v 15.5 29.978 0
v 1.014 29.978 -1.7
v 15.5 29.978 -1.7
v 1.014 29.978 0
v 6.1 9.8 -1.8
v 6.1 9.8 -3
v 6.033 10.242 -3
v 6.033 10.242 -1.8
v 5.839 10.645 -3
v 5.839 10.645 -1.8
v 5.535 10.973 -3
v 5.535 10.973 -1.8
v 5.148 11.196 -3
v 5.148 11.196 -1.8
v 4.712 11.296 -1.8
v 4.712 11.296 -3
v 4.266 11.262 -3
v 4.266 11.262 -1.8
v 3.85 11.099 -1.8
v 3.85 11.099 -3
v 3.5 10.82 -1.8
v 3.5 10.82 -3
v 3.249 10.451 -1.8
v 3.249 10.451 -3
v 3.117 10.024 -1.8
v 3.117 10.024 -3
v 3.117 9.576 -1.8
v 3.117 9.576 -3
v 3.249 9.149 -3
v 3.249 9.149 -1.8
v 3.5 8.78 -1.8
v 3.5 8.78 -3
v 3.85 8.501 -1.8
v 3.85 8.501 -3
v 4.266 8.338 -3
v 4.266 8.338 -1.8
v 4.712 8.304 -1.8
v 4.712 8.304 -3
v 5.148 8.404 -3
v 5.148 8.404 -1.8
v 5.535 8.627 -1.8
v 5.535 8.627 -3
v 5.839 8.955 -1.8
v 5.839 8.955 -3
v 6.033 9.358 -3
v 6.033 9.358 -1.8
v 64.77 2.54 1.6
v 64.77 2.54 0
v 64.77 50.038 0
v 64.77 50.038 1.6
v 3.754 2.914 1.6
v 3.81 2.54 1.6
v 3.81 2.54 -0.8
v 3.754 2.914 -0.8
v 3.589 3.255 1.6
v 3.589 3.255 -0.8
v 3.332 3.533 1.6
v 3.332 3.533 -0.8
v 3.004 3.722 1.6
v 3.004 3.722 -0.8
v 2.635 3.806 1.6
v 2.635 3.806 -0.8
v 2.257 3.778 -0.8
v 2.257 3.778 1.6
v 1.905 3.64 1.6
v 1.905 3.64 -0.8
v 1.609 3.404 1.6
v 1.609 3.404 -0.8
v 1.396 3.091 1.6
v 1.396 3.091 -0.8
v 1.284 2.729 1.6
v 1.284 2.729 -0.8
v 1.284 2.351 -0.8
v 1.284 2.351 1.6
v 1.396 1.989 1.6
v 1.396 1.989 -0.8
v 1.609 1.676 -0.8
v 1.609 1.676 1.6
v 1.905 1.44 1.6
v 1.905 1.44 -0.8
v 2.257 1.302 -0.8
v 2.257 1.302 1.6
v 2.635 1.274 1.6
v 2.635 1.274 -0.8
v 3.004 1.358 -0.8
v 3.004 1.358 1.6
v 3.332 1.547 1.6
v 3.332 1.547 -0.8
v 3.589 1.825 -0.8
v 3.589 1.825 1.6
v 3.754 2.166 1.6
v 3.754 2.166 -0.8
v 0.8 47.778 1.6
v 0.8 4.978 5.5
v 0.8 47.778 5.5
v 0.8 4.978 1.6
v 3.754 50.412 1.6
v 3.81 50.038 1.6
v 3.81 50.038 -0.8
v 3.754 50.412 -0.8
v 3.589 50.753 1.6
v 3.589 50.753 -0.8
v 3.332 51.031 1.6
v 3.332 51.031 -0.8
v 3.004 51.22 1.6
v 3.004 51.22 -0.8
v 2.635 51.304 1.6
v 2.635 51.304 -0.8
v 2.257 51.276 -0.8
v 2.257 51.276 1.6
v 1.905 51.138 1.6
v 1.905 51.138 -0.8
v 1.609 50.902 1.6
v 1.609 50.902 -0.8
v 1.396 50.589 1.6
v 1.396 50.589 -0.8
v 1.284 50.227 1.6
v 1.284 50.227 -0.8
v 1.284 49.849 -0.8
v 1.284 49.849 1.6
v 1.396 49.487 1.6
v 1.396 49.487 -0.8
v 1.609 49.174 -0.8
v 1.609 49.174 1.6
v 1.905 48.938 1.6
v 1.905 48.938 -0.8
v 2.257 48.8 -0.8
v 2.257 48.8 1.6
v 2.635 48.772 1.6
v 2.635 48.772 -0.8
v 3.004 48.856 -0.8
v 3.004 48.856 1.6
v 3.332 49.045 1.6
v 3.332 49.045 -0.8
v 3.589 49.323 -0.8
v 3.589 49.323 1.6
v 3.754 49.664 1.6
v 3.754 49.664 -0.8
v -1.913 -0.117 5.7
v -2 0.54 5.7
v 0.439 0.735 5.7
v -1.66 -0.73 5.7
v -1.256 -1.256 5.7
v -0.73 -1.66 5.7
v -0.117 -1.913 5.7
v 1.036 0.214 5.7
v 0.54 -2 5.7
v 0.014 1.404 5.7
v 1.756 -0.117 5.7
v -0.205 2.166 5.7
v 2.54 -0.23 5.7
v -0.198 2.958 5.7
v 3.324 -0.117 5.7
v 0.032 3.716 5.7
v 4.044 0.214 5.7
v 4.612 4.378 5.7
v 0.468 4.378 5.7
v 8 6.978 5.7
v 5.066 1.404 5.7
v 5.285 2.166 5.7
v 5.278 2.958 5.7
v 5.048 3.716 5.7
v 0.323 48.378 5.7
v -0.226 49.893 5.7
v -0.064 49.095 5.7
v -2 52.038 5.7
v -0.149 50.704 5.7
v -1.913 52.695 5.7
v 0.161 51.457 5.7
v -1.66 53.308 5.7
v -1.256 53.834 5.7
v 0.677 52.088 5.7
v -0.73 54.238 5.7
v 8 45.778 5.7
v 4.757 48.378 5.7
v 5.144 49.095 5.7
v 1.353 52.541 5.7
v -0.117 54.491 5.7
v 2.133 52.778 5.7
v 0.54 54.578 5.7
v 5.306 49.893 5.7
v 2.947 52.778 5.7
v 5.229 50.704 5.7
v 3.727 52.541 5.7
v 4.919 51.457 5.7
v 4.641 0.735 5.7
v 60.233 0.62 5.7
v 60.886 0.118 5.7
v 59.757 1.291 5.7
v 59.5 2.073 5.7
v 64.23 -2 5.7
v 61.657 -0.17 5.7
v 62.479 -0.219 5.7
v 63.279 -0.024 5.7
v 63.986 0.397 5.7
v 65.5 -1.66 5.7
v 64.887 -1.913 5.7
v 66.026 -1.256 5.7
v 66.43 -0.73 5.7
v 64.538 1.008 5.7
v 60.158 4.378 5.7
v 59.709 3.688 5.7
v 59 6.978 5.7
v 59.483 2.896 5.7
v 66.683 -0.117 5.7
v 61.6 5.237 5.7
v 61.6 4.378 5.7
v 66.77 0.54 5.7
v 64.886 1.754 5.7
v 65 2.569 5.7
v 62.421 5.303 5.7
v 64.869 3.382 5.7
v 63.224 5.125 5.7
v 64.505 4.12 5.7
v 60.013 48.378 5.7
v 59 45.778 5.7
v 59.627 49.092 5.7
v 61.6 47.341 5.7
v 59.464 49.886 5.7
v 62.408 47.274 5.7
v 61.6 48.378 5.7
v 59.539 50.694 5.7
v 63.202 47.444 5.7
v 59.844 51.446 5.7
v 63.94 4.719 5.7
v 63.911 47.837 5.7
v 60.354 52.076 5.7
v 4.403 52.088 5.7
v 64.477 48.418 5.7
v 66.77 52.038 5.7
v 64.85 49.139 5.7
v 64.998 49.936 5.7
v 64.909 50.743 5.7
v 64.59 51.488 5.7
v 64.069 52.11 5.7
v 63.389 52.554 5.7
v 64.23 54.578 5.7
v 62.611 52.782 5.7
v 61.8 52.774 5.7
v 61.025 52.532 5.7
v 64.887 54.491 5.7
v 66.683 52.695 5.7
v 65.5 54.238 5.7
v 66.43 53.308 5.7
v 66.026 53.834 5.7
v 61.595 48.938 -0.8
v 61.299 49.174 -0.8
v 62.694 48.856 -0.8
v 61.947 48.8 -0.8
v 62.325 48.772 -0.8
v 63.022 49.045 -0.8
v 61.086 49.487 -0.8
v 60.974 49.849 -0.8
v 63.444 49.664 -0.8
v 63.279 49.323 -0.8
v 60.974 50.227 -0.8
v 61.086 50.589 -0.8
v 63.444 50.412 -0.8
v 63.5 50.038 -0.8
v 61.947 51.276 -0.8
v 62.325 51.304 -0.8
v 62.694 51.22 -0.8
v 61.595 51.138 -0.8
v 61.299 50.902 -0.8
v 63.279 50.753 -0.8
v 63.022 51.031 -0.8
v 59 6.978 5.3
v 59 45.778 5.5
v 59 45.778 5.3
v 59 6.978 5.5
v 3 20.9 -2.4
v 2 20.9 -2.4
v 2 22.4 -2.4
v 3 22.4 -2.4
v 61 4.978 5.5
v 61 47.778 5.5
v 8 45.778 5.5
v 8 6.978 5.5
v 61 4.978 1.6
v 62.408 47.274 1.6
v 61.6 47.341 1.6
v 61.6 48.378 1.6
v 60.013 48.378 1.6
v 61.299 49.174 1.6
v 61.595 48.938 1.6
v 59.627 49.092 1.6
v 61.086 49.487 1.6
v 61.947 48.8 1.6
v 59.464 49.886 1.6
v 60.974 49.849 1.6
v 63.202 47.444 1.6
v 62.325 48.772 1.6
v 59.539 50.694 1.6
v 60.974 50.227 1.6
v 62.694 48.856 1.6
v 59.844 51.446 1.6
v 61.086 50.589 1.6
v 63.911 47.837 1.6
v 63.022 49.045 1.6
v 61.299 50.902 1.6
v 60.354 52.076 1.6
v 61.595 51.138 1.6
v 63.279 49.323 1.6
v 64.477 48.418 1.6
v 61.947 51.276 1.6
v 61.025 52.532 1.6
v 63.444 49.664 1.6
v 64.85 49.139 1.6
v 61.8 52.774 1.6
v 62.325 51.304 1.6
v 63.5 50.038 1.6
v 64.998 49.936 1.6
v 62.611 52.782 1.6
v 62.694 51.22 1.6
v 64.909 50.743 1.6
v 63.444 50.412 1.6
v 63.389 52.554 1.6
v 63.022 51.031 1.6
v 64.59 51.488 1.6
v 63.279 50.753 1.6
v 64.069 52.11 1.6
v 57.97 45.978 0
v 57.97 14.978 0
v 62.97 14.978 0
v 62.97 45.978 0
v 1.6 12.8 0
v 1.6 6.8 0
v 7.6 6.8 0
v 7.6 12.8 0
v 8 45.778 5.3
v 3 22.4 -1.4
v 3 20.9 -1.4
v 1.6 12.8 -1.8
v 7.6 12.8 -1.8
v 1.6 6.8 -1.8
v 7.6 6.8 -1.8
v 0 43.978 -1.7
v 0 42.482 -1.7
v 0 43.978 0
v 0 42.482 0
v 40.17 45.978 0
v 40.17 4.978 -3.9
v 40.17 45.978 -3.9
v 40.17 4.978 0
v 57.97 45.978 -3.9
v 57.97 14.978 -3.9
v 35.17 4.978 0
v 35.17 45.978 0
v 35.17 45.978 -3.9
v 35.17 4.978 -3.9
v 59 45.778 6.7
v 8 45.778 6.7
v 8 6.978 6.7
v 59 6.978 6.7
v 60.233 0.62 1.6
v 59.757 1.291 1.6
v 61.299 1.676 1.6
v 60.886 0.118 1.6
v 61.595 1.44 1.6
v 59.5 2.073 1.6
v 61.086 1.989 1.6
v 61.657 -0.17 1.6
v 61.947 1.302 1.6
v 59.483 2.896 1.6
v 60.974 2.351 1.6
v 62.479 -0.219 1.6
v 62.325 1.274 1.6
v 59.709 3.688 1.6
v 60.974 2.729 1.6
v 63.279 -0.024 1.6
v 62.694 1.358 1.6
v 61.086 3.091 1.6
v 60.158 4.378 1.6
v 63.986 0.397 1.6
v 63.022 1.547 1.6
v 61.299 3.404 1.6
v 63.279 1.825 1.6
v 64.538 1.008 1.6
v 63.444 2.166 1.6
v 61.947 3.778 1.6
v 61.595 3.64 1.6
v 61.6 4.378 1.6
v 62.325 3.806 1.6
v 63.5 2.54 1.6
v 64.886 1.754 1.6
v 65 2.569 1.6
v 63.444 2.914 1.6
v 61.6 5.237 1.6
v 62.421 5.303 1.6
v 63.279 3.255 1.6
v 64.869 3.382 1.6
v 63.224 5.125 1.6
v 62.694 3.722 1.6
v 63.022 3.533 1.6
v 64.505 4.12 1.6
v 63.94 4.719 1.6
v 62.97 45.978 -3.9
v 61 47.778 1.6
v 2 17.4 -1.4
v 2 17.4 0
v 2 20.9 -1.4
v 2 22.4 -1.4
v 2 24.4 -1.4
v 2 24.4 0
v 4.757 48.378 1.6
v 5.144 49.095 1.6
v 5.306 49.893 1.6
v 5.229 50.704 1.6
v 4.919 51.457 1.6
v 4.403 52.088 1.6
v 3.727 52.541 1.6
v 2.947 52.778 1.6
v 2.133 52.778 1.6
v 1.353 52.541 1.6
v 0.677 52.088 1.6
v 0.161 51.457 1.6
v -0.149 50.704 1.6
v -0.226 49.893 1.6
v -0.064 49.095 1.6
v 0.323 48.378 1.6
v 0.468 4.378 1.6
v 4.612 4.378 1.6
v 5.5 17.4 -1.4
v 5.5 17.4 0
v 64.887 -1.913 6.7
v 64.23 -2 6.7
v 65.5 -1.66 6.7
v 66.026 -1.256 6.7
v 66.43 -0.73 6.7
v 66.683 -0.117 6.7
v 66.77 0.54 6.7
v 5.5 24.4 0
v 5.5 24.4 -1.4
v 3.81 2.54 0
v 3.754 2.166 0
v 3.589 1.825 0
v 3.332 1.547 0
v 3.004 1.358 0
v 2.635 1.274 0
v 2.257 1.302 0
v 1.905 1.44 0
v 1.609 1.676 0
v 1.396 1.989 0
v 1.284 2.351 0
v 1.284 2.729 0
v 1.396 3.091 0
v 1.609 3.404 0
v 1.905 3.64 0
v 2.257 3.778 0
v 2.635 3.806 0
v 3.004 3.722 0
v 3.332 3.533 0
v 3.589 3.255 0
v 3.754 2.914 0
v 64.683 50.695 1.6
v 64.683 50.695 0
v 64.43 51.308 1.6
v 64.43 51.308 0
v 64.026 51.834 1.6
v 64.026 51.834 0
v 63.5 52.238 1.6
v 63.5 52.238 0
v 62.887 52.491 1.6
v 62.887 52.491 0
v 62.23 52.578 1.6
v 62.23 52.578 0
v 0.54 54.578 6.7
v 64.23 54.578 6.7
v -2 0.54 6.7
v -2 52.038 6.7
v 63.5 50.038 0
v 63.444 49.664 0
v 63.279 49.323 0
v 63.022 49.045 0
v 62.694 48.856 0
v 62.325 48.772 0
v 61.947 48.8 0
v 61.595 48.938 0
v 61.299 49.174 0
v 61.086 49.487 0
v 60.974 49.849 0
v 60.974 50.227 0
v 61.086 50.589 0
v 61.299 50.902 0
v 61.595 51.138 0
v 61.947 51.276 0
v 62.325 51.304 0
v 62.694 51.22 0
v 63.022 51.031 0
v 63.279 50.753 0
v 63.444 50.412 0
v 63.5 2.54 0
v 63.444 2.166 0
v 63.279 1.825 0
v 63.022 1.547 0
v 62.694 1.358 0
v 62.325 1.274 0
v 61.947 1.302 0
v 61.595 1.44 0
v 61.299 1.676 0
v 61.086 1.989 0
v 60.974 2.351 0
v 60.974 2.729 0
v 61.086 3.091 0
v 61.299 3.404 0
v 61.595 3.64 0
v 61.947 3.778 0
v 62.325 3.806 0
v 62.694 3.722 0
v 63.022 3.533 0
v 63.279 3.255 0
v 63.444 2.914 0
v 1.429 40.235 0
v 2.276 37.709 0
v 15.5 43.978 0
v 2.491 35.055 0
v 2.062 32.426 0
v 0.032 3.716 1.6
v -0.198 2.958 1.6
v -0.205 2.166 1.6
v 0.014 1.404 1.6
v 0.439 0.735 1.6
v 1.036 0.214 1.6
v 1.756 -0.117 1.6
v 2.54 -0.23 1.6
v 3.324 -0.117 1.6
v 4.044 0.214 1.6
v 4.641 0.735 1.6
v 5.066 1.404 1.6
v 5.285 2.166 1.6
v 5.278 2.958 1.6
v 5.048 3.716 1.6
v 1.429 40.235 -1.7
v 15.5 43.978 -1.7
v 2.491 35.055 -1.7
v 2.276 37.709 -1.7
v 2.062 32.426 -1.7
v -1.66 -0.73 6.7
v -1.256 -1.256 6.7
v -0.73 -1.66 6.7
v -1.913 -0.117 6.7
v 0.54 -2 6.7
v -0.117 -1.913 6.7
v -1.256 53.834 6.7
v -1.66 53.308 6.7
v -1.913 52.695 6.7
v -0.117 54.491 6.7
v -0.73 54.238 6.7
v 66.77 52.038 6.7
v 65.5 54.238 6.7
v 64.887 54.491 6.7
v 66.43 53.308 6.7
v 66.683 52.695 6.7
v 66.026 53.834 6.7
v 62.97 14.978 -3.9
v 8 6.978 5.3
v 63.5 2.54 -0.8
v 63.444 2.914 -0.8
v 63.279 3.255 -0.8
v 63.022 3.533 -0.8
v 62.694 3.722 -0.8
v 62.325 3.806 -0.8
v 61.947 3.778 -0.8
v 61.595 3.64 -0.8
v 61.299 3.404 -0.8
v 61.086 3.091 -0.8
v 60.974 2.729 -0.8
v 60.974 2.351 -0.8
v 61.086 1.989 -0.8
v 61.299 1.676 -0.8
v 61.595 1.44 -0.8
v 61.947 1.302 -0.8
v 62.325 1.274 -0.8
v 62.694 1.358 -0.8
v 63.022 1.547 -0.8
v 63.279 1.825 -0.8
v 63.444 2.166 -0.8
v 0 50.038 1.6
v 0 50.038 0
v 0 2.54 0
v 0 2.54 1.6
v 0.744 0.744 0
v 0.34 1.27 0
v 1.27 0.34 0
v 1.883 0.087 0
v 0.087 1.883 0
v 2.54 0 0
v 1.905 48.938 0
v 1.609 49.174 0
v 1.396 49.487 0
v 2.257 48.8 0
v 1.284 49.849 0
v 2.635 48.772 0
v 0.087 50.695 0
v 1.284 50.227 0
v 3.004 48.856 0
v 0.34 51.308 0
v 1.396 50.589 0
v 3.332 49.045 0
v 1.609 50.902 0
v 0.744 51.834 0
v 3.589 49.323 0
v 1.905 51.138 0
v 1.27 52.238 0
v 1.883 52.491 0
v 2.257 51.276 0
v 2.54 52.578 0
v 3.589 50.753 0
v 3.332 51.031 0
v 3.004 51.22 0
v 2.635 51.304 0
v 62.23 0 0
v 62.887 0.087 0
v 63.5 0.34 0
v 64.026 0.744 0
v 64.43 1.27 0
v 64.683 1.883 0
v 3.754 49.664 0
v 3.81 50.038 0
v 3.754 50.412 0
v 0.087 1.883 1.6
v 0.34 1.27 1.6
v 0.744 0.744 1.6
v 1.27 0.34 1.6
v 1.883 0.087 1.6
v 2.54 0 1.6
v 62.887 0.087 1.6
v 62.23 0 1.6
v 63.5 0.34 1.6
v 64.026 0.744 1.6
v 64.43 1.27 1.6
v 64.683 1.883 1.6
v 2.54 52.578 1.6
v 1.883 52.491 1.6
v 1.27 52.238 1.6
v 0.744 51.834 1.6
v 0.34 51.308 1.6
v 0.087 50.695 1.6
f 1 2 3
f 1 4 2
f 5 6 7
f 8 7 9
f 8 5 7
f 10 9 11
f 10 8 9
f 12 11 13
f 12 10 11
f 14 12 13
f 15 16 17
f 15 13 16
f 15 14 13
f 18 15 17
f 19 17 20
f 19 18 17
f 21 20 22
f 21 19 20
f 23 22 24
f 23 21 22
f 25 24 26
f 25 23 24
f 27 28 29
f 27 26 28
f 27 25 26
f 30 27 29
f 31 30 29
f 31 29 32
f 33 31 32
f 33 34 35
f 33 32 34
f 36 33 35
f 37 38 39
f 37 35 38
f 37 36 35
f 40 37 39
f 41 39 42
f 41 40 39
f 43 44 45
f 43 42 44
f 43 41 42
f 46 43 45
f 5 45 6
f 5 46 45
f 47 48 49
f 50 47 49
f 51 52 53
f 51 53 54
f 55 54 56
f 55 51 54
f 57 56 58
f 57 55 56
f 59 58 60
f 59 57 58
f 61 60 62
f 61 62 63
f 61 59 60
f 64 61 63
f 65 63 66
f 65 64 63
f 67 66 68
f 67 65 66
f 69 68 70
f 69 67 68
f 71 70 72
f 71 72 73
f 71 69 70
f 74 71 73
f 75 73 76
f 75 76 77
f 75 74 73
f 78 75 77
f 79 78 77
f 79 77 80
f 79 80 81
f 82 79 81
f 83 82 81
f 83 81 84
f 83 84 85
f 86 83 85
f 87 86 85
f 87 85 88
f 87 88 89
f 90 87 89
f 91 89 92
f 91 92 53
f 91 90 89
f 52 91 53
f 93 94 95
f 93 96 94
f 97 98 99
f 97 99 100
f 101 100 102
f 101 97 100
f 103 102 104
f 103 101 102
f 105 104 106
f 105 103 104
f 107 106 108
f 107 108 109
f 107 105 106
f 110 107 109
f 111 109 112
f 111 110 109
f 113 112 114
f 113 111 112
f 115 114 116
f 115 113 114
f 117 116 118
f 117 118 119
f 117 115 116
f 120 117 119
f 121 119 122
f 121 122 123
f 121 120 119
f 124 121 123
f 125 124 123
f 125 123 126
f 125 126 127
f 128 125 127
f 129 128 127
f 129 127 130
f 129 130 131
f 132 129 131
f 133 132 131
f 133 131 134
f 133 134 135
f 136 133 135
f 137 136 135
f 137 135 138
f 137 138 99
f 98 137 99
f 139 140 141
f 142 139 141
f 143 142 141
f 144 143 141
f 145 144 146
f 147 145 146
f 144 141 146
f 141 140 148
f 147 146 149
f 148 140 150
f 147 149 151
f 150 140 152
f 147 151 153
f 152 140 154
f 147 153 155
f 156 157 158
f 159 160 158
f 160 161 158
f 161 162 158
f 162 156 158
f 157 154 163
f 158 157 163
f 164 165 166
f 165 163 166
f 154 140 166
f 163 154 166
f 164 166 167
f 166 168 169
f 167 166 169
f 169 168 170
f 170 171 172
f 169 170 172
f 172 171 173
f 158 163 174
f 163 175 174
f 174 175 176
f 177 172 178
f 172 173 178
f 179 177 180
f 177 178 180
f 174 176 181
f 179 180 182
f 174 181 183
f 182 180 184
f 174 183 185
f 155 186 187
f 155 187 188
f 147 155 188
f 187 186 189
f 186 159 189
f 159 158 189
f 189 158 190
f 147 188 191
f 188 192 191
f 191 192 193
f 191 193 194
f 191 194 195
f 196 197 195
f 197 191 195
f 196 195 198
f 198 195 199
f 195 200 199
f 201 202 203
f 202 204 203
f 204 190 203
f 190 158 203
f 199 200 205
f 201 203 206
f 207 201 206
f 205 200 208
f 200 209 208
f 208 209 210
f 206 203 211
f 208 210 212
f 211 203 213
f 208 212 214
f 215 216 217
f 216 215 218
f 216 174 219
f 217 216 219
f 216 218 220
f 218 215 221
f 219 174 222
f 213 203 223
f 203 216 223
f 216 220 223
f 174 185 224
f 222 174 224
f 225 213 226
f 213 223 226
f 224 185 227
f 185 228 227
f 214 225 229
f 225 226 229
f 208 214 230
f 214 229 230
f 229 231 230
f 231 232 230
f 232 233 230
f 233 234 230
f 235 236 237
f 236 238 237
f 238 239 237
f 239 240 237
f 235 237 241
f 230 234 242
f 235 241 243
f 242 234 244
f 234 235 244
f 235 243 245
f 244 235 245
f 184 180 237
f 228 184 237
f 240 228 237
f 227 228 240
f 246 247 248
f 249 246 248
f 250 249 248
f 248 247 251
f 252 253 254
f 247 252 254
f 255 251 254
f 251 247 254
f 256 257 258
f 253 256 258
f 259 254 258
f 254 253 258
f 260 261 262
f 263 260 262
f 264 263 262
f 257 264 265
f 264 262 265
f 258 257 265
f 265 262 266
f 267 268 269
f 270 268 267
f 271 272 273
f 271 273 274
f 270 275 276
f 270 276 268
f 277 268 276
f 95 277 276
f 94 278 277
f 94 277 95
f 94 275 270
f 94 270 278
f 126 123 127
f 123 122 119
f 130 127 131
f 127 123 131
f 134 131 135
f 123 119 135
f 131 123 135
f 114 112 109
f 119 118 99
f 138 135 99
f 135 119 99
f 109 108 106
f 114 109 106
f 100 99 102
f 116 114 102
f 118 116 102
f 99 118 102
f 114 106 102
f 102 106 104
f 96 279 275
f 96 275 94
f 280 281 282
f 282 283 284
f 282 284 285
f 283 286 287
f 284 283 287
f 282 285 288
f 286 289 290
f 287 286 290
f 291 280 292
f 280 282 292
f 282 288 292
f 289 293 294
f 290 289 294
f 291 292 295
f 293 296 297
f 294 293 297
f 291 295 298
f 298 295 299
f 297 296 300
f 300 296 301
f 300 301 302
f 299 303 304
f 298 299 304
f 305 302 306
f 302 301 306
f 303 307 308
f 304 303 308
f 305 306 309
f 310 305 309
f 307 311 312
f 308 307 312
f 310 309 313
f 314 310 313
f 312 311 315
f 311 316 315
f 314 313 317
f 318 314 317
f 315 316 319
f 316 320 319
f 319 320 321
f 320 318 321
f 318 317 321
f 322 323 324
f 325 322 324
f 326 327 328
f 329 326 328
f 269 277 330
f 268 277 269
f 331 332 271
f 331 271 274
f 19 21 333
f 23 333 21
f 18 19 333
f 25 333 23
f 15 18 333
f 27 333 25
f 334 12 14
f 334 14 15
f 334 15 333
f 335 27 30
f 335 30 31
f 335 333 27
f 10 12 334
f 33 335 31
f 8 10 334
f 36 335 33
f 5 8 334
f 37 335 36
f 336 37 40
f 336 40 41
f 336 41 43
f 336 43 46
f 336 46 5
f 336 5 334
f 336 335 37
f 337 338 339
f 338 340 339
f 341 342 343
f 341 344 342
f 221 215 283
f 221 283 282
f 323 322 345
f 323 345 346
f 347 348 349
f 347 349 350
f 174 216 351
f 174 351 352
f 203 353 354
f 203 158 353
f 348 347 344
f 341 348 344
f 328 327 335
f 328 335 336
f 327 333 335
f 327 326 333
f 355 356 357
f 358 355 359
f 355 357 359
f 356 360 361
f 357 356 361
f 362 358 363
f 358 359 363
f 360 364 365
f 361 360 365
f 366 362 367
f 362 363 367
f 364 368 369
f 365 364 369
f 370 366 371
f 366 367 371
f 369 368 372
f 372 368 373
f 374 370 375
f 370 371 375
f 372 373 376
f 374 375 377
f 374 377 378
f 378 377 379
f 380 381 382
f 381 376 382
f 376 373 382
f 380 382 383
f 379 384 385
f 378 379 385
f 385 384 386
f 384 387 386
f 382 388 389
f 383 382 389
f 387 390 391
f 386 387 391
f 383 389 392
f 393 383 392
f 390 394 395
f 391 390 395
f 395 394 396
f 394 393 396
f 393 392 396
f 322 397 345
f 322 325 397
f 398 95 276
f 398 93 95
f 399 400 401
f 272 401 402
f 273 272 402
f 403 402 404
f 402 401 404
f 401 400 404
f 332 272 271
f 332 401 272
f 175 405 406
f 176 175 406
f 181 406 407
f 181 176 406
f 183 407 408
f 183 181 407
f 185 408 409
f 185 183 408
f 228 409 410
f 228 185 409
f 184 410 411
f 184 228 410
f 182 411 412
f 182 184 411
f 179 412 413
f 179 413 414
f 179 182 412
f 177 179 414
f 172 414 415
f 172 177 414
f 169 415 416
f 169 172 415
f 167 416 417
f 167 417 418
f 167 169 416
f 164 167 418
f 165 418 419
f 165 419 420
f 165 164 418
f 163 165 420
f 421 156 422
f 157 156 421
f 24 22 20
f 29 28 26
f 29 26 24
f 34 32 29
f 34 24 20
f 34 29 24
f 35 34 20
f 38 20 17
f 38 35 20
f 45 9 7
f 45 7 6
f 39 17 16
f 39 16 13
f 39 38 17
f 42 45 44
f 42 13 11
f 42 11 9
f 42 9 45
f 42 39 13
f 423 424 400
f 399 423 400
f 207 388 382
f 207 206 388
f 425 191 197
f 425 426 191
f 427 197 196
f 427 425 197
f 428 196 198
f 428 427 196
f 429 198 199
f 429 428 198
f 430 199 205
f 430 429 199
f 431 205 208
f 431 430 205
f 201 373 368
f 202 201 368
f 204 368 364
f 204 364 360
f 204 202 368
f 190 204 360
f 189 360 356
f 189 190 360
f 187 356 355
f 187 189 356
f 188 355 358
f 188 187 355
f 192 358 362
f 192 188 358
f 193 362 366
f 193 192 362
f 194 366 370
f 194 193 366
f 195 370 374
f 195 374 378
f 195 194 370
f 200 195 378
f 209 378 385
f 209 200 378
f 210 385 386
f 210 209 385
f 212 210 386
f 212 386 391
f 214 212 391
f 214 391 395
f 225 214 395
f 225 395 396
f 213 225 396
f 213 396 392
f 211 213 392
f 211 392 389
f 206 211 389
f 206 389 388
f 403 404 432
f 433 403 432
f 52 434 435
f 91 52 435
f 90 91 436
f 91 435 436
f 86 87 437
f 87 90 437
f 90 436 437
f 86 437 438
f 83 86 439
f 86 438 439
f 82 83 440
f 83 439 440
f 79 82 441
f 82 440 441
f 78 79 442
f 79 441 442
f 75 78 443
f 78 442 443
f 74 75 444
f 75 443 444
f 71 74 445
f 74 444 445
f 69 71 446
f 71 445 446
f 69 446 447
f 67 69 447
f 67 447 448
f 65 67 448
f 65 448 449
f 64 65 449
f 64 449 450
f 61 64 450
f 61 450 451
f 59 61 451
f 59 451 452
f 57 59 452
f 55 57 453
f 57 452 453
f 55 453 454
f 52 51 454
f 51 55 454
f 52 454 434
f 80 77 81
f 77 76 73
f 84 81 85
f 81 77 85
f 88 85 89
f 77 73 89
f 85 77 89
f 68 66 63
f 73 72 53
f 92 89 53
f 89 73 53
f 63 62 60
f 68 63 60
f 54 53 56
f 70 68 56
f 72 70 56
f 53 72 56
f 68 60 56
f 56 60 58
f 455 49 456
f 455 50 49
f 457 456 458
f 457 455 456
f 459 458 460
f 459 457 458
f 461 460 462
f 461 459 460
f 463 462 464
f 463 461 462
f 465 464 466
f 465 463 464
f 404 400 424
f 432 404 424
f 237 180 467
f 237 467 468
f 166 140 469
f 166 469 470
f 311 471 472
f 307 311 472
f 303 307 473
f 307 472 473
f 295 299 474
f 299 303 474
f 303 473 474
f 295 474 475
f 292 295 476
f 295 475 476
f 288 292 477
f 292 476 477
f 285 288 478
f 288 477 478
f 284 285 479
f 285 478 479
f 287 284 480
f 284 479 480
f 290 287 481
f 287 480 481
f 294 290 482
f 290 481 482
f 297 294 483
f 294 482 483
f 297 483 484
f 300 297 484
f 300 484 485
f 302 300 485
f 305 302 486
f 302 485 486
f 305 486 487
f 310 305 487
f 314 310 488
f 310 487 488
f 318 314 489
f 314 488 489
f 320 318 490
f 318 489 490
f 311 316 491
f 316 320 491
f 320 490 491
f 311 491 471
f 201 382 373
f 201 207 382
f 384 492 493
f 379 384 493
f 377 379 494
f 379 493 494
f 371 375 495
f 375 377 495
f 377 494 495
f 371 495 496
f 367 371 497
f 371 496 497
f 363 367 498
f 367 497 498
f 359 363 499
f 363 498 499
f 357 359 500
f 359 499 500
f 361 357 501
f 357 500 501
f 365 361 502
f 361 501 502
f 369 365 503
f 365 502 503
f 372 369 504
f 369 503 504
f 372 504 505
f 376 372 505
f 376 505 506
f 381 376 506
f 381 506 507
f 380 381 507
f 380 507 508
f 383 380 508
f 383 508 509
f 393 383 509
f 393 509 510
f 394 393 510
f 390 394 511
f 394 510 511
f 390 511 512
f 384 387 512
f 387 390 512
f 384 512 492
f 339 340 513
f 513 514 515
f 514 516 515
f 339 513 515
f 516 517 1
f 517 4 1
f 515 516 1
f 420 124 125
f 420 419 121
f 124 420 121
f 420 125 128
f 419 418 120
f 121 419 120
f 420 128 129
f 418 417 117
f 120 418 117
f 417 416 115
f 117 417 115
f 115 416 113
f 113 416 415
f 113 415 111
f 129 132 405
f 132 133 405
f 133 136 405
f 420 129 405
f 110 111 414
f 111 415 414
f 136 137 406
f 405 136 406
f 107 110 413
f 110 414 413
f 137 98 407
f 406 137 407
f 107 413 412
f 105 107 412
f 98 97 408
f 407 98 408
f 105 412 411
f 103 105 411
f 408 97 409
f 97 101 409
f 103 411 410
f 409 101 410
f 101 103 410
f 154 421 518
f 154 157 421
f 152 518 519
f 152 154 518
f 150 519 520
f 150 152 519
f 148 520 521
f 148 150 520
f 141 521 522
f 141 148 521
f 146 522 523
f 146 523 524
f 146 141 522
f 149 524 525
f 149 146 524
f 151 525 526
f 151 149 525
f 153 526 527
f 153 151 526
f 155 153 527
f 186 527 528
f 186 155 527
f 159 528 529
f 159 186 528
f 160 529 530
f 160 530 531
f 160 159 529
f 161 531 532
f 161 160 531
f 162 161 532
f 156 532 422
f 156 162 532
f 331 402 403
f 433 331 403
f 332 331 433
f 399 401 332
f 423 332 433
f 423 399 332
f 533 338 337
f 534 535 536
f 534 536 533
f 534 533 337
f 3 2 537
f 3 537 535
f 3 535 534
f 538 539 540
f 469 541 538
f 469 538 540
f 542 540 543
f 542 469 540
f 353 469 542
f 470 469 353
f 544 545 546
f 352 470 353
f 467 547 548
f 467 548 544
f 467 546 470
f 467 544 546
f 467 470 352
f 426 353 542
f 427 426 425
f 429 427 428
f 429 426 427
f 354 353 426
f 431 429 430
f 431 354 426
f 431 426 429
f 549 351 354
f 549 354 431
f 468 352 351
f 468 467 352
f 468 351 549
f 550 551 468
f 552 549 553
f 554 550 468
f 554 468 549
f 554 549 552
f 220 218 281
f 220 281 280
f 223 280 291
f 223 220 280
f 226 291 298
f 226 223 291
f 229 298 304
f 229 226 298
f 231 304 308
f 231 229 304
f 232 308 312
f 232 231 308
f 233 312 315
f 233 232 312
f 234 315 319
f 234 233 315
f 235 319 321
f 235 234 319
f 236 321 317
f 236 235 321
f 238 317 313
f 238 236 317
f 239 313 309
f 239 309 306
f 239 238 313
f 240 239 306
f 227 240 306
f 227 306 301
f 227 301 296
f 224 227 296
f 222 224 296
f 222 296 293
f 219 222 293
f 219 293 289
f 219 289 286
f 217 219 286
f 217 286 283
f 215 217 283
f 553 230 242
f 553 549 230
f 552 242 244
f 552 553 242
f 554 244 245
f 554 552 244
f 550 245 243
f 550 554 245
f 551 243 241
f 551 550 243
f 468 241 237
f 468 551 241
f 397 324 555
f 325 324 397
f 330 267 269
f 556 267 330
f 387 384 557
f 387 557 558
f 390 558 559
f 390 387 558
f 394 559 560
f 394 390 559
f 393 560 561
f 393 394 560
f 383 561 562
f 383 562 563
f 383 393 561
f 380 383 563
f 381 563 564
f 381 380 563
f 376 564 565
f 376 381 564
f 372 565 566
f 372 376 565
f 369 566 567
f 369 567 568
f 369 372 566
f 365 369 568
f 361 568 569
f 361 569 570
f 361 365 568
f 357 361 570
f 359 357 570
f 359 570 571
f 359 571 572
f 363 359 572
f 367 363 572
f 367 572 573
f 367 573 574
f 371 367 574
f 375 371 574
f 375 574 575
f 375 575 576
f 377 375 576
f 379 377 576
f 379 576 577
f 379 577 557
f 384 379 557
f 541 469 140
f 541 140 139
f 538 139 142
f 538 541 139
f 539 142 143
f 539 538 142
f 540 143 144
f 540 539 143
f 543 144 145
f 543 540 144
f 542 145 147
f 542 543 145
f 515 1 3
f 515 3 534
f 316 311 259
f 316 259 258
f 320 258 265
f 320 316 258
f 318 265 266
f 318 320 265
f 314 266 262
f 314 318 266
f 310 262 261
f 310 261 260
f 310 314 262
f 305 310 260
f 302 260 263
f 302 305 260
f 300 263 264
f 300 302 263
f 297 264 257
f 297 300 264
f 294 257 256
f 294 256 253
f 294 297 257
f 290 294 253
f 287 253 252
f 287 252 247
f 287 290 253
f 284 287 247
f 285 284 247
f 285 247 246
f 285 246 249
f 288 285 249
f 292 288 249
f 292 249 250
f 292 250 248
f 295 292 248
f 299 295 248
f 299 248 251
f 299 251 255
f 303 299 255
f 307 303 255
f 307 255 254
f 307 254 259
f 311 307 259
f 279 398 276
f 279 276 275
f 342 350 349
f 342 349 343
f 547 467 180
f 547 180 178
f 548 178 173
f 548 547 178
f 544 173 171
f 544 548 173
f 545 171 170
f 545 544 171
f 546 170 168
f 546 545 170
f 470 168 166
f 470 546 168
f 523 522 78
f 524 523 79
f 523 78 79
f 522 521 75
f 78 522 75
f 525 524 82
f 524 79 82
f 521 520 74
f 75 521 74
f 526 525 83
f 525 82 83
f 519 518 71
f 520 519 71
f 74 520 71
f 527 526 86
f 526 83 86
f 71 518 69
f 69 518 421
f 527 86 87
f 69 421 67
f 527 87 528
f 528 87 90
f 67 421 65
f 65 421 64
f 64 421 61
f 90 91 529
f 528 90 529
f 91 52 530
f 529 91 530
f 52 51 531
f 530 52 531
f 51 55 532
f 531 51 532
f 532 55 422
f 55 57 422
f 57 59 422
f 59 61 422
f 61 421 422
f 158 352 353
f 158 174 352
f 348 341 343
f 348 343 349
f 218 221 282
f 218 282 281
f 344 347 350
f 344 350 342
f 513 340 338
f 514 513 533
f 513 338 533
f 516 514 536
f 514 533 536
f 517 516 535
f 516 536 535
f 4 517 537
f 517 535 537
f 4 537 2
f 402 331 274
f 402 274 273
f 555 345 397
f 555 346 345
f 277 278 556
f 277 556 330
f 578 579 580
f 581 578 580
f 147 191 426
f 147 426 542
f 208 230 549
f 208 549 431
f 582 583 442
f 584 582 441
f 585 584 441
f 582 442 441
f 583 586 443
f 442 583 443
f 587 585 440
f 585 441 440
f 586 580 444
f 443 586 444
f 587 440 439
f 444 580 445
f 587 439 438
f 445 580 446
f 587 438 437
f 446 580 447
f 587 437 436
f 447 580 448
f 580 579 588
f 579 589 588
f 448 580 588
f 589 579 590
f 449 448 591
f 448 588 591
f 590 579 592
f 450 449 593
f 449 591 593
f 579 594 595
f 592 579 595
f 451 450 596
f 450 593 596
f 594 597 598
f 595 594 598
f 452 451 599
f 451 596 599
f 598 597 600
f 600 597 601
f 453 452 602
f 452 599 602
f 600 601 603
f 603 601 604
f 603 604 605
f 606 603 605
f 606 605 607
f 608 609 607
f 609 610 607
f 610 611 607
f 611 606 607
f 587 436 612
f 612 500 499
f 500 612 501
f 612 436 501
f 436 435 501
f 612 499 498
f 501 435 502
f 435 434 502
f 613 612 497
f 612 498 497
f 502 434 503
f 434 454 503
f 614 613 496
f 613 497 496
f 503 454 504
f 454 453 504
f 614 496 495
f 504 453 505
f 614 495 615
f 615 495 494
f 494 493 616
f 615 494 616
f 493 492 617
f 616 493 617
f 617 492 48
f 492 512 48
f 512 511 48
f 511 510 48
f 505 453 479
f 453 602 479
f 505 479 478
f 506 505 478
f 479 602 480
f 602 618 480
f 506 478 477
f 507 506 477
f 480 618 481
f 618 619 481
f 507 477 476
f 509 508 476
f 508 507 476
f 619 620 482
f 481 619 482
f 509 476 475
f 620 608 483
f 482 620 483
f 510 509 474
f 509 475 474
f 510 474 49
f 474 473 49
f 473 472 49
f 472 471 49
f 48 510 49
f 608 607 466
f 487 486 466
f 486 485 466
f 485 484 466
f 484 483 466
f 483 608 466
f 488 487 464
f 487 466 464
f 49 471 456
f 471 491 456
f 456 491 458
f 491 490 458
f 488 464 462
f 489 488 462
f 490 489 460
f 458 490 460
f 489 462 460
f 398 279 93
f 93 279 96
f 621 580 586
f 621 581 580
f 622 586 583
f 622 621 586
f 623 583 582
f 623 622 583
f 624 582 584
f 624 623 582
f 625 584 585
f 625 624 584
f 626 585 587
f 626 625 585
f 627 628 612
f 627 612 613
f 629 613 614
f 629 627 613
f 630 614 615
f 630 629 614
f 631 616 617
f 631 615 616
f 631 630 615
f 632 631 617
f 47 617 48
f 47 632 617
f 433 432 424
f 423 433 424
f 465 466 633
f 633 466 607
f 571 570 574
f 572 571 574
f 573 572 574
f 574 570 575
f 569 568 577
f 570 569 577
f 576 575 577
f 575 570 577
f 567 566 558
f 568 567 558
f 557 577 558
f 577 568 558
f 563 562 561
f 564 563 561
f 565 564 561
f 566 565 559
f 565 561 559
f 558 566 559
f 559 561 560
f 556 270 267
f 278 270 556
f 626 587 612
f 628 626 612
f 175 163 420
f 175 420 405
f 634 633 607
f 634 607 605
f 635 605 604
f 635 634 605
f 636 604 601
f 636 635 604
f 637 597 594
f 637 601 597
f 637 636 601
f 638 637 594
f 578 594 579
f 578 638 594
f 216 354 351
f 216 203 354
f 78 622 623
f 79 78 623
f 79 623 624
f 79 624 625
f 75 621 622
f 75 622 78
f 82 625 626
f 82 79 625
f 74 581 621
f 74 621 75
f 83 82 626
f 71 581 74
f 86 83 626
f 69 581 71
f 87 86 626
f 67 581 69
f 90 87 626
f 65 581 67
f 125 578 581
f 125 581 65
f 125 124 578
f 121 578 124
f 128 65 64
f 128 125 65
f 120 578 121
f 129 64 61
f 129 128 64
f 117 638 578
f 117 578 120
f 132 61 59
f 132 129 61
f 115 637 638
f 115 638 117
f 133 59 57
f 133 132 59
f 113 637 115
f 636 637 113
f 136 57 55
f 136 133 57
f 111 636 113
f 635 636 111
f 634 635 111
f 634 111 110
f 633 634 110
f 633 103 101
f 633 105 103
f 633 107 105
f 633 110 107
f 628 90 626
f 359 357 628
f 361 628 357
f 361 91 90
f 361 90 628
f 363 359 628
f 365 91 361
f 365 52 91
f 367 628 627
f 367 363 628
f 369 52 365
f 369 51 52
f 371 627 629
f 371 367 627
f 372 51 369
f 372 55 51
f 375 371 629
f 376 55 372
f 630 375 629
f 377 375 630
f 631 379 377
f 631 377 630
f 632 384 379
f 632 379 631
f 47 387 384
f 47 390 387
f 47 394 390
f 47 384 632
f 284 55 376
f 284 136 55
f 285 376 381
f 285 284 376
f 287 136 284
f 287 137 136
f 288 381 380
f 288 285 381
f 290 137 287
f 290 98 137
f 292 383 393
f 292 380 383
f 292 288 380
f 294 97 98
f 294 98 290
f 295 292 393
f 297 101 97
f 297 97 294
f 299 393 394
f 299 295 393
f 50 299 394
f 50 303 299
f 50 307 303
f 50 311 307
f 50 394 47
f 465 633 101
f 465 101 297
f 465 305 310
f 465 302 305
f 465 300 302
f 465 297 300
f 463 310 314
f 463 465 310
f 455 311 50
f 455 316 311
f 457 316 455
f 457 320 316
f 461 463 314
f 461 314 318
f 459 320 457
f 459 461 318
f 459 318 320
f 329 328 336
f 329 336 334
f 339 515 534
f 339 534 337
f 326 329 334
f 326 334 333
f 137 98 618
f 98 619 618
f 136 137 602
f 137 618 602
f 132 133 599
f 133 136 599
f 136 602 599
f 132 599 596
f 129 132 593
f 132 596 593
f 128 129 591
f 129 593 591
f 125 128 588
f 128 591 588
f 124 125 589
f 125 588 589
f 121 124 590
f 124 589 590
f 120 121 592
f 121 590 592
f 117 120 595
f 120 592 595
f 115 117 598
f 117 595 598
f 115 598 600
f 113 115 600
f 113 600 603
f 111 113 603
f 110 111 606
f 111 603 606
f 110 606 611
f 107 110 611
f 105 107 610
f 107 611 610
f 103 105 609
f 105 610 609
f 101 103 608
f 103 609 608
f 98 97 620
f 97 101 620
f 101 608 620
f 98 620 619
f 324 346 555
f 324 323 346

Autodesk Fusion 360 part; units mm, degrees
sketch "pcb" plane through (0, 0, 0) normal (0, 0, 1) x (1, 0, 0)
  line L0 (0, 0) -> (64.77, 0)
  line L1 (64.77, 0) -> (64.77, 52.578)
  line L2 (64.77, 52.578) -> (0, 52.578)
  line L3 (0, 52.578) -> (0, 0)
  circle A0 centre (2.54, 50.038) radius 1.27
  line L4 (32.385, 52.578) -> (32.385, 0) construction
  line L5 (0, 26.289) -> (64.77, 26.289) construction
  circle A1 centre (62.23, 50.038) radius 1.27
  circle A2 centre (2.54, 2.54) radius 1.27
  circle A3 centre (62.23, 2.54) radius 1.27
  dimension "d1" = 64.77
  dimension "d2" = 52.578
  dimension "d3" = 2.54
  dimension "d4" = 2.54
  dimension "d5" = 2.54
extrude "Extrude1" add sketch "pcb" along normal blind 1.6 makes body 1
fillet "Fillet1" radius 2.54 4 edges at (64.77, 0, 0.8) (0, 0, 0.8) (0, 52.578, 0.8) (64.77, 52.578, 0.8) on bodies 1
sketch "bottom" plane through (0, 0, 0) normal (0, 0, -1) x (1, 0, 0)
  circle A0 centre (62.23, -50.038) radius 1.27
  circle A1 centre (2.54, -2.54) radius 1.27
  circle A2 centre (62.23, -2.54) radius 1.27
  circle A3 centre (2.54, -50.038) radius 1.27
  arc A4 (62.23, -52.578) -> (64.77, -50.038) centre (62.23, -50.038) ccw
  line L0 (64.77, -50.038) -> (64.77, -2.54)
  arc A5 (64.77, -2.54) -> (62.23, 0) centre (62.23, -2.54) ccw
  line L1 (62.23, 0) -> (2.54, 0)
  arc A6 (2.54, 0) -> (0, -2.54) centre (2.54, -2.54) ccw
  line L2 (0, -2.54) -> (0, -50.038)
  arc A7 (0, -50.038) -> (2.54, -52.578) centre (2.54, -50.038) ccw
  line L3 (2.54, -52.578) -> (62.23, -52.578)
  line L4 (62.97, -45.978) -> (57.97, -45.978)
  line L5 (57.97, -45.978) -> (57.97, -14.978)
  line L6 (57.97, -14.978) -> (62.97, -14.978)
  line L7 (62.97, -14.978) -> (62.97, -45.978)
  line L8 (40.17, -45.978) -> (35.17, -45.978)
  line L9 (35.17, -45.978) -> (35.17, -4.978)
  line L10 (35.17, -4.978) -> (40.17, -4.978)
  line L11 (40.17, -4.978) -> (40.17, -45.978)
  line L12 (1.6, -6.8) -> (7.6, -6.8)
  line L13 (7.6, -6.8) -> (7.6, -12.8)
  line L14 (7.6, -12.8) -> (1.6, -12.8)
  line L15 (1.6, -12.8) -> (1.6, -6.8)
  line L16 (1.6, -6.8) -> (7.6, -12.8) construction
  line L17 (7.6, -6.8) -> (1.6, -12.8) construction
  circle A8 centre (4.6, -9.8) radius 1.5
  line L18 (5.5, -17.4) -> (2, -17.4)
  line L19 (2, -17.4) -> (2, -24.4)
  line L20 (2, -24.4) -> (5.5, -24.4)
  line L21 (5.5, -24.4) -> (5.5, -17.4)
  line L22 (15.5, -43.978) -> (0, -43.978)
  line L23 (0, -43.978) -> (0, -29.978)
  line L24 (0, -29.978) -> (15.5, -29.978)
  line L25 (15.5, -29.978) -> (15.5, -43.978)
  point P0 (4.6, -9.8)
  dimension "d9" = 5
  dimension "d10" = 5
  dimension "d11" = 31
  dimension "d12" = 41
  dimension "d13" = 6.6
  dimension "d14" = 6.6
  dimension "d15" = 1.8
  dimension "d16" = 17.8
  dimension "d19" = 6
  dimension "d20" = 6
  dimension "d21" = 6.8
  dimension "d22" = 1.6
  dimension "d23" = 3
  dimension "d28" = 3.5
  dimension "d29" = 7
  dimension "d30" = 2
  dimension "d31" = 17.4
  dimension "d32" = 15.5
  dimension "d33" = 14
  dimension "d34" = 8.6
extrude "Extrude2" add sketch "bottom" along normal blind 3.9 separate body contours L4 L5 L6 L7 | L8 L9 L10 L11 makes body 2 at (61.3033, 25.3113, 0) makes body 3 at (38.5033, 32.3113, 0)
extrude "Extrude3" add sketch "bottom" along normal blind 1.8 separate body contours L12 L13 L14 L15 | A8 makes body 4
extrude "Extrude4" add sketch "bottom" along normal blind 3 contours A8 bodies 4
extrude "Extrude5" add sketch "bottom" along normal blind 1.4 separate body contours L18 L19 L20 L21 makes body 5
extrude "Extrude6" add sketch "bottom" along normal blind 1.7 separate body contours L2 L22 L23 L24 L25 makes body 6
sketch "microSD" plane through (0, 0, -1.7) normal (0, 0, -1) x (1, 0, 0)
  line L0 (15.5, -29.978) -> (0, -29.978)
  line L1 (0, -29.978) -> (0, -43.978)
  line L2 (0, -43.978) -> (15.5, -43.978)
  line L3 (15.5, -43.978) -> (15.5, -29.978)
  circle A0 centre (-8.5, -35.5) radius 11
  dimension "d39" = 22
extrude "Extrude7" cut sketch "microSD" against normal blind 1.7 contours L0 L1 A0 picked at (0.2923, -37.9037) bodies 6
sketch "switch" plane through (0, 0, -1.4) normal (0, 0, -1) x (1, 0, 0)
  line L0 (5.5, -24.4) -> (5.5, -17.4)
  line L1 (5.5, -17.4) -> (2, -17.4)
  line L2 (2, -17.4) -> (2, -24.4)
  line L3 (2, -24.4) -> (5.5, -24.4)
  line L4 (2, -20.9) -> (5.5, -20.9)
  line L5 (2, -19.4) -> (3, -19.4)
  line L6 (3, -19.4) -> (3, -22.4)
  line L7 (3, -22.4) -> (2, -22.4)
  line L8 (2, -22.4) -> (2, -19.4)
  line L9 (3, -20.9) -> (2, -20.9) construction
  dimension "d42" = 3
  dimension "d43" = 1
extrude "Extrude8" add sketch "switch" along normal blind 1 contours L2 L4 L6 L7 L8 bodies 5
sketch "display" plane through (0, 0, 1.6) normal (0, 0, 1) x (-1, 0, 0)
  arc A0 (-64.77, -50.038) -> (-62.23, -52.578) centre (-62.23, -50.038) ccw
  line L0 (-62.23, -52.578) -> (-2.54, -52.578)
  arc A1 (-2.54, -52.578) -> (0, -50.038) centre (-2.54, -50.038) ccw
  line L1 (0, -50.038) -> (0, -2.54)
  arc A2 (0, -2.54) -> (-2.54, 0) centre (-2.54, -2.54) ccw
  line L2 (-2.54, 0) -> (-62.23, 0)
  arc A3 (-62.23, 0) -> (-64.77, -2.54) centre (-62.23, -2.54) ccw
  line L3 (-64.77, -2.54) -> (-64.77, -50.038)
  circle A4 centre (-62.23, -50.038) radius 1.27
  circle A5 centre (-2.54, -2.54) radius 1.27
  circle A6 centre (-62.23, -2.54) radius 1.27
  circle A7 centre (-2.54, -50.038) radius 1.27
  line L4 (-0.8, -47.778) -> (-61, -47.778)
  line L5 (-61, -47.778) -> (-61, -4.978)
  line L6 (-61, -4.978) -> (-0.8, -4.978)
  line L7 (-0.8, -4.978) -> (-0.8, -47.778)
  dimension "d46" = 60.2
  dimension "d47" = 42.8
  dimension "d48" = 4.8
  dimension "d49" = 0.8
extrude "Extrude9" add sketch "display" along normal blind 3.9 separate body contours L4 L5 L6 L7 makes body 7
sketch "view" plane through (0, 0, 5.5) normal (0, 0, 1) x (-1, 0, 0)
  line L0 (-0.8, -4.978) -> (-61, -4.978)
  line L1 (-61, -4.978) -> (-61, -47.778)
  line L2 (-61, -47.778) -> (-0.8, -47.778)
  line L3 (-0.8, -47.778) -> (-0.8, -4.978)
  line L4 (-8, -45.778) -> (-59, -45.778)
  line L5 (-59, -45.778) -> (-59, -6.978)
  line L6 (-59, -6.978) -> (-8, -6.978)
  line L7 (-8, -6.978) -> (-8, -45.778)
  dimension "d52" = 2
  dimension "d53" = 2
  dimension "d54" = 2
  dimension "d55" = 7.2
extrude "Extrude10" cut sketch "view" against normal blind 0.2 contours L4 L5 L6 L7 bodies 7
ref_plane "WorkPlane1" through (30.9, 26.378, 5.7) normal (0, 0, 1) x (1, 0, 0) in component "mount"
sketch "Sketch1" plane through (30.9, 26.378, 5.7) normal (0, 0, 1) x (1, 0, 0) in component "mount"
  line L0 (-32.9, 28.2) -> (35.87, 28.2)
  line L1 (35.87, 28.2) -> (35.87, -28.378)
  line L2 (35.87, -28.378) -> (-32.9, -28.378)
  line L3 (-32.9, -28.378) -> (-32.9, 28.2)
  line L4 (31.33, 26.2) -> (-28.36, 26.2) construction
  line L5 (33.87, -23.838) -> (33.87, 23.66) construction
  line L6 (-30.9, 23.66) -> (-30.9, -23.838) construction
  line L7 (-28.36, -26.378) -> (31.33, -26.378) construction
  line L8 (-22.9, -19.4) -> (28.1, -19.4)
  line L9 (28.1, -19.4) -> (28.1, 19.4)
  line L10 (28.1, 19.4) -> (-22.9, 19.4)
  line L11 (-22.9, 19.4) -> (-22.9, -19.4)
  circle A0 centre (-28.36, -23.838) radius 1.27
  circle A1 centre (31.33, -23.838) radius 1.27
  circle A2 centre (31.33, 23.66) radius 1.27
  circle A3 centre (-28.36, 23.66) radius 1.27
  line L12 (30.1, -21.4) -> (-30.1, -21.4) construction
  line L13 (-30.1, -21.4) -> (-30.1, 21.4) construction
  line L14 (-30.1, 21.4) -> (30.1, 21.4) construction
  line L15 (30.1, 21.4) -> (30.1, -21.4) construction
  circle A4 centre (-28.36, -23.838) radius 2.77
  circle A5 centre (31.33, 23.66) radius 2.77
  circle A6 centre (-28.36, 23.66) radius 2.77
  line L16 (-30.7, -22) -> (-30.7, 22)
  line L17 (-30.7, 22) -> (30.7, 22)
  line L18 (30.7, 22) -> (30.7, -22)
  line L19 (30.7, -22) -> (-30.7, -22)
  circle A7 centre (31.33, -23.838) radius 2.77
  point P0 (30.06, -23.838)
  dimension "d59" = 2
  dimension "d60" = 2
  dimension "d61" = 2
  dimension "d62" = 2
  dimension "d65" = 1.5
  dimension "d66" = 1.5
  dimension "d67" = 1.5
  dimension "d68" = 1.5
  dimension "d74" = 0.6
extrude "Extrude1'" add sketch "Sketch1" along normal blind 1 separate body contours L0 L1 L2 L3 | A0 | A1 | A2 | A3 | A4 L19 | A4 L19 | A4 A5 A6 L16 L17 L18 L19 A7 | L18 L19 A7 | L18 L19 A7 | A5 L17 L18 | A5 L17 L18 | A6 L17 | A6 L17 makes body 8 in component "mount"
extrude "Extrude2'" add sketch "Sketch1" against normal up to surface (4.1 mm away) contours A0 | A1 | A2 | A3 | A4 L19 | A4 L19 | L18 L19 A7 | L18 L19 A7 | A5 L17 L18 | A5 L17 L18 | A6 L17 | A6 L17 bodies 8 in component "mount"
extrude "Extrude3'" add sketch "Sketch1" against normal blind 6.5 contours A0 | A1 | A2 | A3 bodies 8 in component "mount"
fillet "Fillet1'" radius 2.54 4 edges at (-2, -2, 6.2) (66.77, -2, 6.2) (-2, 54.578, 6.2) (66.77, 54.578, 6.2) on bodies 8 in component "mount"
extrude "Extrude4'" cut sketch "Sketch1" against normal blind 5 contours A4 L19 | A4 A5 A6 L16 L17 L18 L19 A7 | L18 L19 A7 | A5 L17 L18 | A6 L17 picked at (-28.2304, -21.6985) picked at (30.5911, -21.4597) picked at (30.5768, 21.3464) picked at (-27.9175, 21.7429) bodies 8 in component "mount"
component "mount" placed x (1, 0, 0) y (0, 1, 0) z (0, 0, 1) at (0, 0, 0)
